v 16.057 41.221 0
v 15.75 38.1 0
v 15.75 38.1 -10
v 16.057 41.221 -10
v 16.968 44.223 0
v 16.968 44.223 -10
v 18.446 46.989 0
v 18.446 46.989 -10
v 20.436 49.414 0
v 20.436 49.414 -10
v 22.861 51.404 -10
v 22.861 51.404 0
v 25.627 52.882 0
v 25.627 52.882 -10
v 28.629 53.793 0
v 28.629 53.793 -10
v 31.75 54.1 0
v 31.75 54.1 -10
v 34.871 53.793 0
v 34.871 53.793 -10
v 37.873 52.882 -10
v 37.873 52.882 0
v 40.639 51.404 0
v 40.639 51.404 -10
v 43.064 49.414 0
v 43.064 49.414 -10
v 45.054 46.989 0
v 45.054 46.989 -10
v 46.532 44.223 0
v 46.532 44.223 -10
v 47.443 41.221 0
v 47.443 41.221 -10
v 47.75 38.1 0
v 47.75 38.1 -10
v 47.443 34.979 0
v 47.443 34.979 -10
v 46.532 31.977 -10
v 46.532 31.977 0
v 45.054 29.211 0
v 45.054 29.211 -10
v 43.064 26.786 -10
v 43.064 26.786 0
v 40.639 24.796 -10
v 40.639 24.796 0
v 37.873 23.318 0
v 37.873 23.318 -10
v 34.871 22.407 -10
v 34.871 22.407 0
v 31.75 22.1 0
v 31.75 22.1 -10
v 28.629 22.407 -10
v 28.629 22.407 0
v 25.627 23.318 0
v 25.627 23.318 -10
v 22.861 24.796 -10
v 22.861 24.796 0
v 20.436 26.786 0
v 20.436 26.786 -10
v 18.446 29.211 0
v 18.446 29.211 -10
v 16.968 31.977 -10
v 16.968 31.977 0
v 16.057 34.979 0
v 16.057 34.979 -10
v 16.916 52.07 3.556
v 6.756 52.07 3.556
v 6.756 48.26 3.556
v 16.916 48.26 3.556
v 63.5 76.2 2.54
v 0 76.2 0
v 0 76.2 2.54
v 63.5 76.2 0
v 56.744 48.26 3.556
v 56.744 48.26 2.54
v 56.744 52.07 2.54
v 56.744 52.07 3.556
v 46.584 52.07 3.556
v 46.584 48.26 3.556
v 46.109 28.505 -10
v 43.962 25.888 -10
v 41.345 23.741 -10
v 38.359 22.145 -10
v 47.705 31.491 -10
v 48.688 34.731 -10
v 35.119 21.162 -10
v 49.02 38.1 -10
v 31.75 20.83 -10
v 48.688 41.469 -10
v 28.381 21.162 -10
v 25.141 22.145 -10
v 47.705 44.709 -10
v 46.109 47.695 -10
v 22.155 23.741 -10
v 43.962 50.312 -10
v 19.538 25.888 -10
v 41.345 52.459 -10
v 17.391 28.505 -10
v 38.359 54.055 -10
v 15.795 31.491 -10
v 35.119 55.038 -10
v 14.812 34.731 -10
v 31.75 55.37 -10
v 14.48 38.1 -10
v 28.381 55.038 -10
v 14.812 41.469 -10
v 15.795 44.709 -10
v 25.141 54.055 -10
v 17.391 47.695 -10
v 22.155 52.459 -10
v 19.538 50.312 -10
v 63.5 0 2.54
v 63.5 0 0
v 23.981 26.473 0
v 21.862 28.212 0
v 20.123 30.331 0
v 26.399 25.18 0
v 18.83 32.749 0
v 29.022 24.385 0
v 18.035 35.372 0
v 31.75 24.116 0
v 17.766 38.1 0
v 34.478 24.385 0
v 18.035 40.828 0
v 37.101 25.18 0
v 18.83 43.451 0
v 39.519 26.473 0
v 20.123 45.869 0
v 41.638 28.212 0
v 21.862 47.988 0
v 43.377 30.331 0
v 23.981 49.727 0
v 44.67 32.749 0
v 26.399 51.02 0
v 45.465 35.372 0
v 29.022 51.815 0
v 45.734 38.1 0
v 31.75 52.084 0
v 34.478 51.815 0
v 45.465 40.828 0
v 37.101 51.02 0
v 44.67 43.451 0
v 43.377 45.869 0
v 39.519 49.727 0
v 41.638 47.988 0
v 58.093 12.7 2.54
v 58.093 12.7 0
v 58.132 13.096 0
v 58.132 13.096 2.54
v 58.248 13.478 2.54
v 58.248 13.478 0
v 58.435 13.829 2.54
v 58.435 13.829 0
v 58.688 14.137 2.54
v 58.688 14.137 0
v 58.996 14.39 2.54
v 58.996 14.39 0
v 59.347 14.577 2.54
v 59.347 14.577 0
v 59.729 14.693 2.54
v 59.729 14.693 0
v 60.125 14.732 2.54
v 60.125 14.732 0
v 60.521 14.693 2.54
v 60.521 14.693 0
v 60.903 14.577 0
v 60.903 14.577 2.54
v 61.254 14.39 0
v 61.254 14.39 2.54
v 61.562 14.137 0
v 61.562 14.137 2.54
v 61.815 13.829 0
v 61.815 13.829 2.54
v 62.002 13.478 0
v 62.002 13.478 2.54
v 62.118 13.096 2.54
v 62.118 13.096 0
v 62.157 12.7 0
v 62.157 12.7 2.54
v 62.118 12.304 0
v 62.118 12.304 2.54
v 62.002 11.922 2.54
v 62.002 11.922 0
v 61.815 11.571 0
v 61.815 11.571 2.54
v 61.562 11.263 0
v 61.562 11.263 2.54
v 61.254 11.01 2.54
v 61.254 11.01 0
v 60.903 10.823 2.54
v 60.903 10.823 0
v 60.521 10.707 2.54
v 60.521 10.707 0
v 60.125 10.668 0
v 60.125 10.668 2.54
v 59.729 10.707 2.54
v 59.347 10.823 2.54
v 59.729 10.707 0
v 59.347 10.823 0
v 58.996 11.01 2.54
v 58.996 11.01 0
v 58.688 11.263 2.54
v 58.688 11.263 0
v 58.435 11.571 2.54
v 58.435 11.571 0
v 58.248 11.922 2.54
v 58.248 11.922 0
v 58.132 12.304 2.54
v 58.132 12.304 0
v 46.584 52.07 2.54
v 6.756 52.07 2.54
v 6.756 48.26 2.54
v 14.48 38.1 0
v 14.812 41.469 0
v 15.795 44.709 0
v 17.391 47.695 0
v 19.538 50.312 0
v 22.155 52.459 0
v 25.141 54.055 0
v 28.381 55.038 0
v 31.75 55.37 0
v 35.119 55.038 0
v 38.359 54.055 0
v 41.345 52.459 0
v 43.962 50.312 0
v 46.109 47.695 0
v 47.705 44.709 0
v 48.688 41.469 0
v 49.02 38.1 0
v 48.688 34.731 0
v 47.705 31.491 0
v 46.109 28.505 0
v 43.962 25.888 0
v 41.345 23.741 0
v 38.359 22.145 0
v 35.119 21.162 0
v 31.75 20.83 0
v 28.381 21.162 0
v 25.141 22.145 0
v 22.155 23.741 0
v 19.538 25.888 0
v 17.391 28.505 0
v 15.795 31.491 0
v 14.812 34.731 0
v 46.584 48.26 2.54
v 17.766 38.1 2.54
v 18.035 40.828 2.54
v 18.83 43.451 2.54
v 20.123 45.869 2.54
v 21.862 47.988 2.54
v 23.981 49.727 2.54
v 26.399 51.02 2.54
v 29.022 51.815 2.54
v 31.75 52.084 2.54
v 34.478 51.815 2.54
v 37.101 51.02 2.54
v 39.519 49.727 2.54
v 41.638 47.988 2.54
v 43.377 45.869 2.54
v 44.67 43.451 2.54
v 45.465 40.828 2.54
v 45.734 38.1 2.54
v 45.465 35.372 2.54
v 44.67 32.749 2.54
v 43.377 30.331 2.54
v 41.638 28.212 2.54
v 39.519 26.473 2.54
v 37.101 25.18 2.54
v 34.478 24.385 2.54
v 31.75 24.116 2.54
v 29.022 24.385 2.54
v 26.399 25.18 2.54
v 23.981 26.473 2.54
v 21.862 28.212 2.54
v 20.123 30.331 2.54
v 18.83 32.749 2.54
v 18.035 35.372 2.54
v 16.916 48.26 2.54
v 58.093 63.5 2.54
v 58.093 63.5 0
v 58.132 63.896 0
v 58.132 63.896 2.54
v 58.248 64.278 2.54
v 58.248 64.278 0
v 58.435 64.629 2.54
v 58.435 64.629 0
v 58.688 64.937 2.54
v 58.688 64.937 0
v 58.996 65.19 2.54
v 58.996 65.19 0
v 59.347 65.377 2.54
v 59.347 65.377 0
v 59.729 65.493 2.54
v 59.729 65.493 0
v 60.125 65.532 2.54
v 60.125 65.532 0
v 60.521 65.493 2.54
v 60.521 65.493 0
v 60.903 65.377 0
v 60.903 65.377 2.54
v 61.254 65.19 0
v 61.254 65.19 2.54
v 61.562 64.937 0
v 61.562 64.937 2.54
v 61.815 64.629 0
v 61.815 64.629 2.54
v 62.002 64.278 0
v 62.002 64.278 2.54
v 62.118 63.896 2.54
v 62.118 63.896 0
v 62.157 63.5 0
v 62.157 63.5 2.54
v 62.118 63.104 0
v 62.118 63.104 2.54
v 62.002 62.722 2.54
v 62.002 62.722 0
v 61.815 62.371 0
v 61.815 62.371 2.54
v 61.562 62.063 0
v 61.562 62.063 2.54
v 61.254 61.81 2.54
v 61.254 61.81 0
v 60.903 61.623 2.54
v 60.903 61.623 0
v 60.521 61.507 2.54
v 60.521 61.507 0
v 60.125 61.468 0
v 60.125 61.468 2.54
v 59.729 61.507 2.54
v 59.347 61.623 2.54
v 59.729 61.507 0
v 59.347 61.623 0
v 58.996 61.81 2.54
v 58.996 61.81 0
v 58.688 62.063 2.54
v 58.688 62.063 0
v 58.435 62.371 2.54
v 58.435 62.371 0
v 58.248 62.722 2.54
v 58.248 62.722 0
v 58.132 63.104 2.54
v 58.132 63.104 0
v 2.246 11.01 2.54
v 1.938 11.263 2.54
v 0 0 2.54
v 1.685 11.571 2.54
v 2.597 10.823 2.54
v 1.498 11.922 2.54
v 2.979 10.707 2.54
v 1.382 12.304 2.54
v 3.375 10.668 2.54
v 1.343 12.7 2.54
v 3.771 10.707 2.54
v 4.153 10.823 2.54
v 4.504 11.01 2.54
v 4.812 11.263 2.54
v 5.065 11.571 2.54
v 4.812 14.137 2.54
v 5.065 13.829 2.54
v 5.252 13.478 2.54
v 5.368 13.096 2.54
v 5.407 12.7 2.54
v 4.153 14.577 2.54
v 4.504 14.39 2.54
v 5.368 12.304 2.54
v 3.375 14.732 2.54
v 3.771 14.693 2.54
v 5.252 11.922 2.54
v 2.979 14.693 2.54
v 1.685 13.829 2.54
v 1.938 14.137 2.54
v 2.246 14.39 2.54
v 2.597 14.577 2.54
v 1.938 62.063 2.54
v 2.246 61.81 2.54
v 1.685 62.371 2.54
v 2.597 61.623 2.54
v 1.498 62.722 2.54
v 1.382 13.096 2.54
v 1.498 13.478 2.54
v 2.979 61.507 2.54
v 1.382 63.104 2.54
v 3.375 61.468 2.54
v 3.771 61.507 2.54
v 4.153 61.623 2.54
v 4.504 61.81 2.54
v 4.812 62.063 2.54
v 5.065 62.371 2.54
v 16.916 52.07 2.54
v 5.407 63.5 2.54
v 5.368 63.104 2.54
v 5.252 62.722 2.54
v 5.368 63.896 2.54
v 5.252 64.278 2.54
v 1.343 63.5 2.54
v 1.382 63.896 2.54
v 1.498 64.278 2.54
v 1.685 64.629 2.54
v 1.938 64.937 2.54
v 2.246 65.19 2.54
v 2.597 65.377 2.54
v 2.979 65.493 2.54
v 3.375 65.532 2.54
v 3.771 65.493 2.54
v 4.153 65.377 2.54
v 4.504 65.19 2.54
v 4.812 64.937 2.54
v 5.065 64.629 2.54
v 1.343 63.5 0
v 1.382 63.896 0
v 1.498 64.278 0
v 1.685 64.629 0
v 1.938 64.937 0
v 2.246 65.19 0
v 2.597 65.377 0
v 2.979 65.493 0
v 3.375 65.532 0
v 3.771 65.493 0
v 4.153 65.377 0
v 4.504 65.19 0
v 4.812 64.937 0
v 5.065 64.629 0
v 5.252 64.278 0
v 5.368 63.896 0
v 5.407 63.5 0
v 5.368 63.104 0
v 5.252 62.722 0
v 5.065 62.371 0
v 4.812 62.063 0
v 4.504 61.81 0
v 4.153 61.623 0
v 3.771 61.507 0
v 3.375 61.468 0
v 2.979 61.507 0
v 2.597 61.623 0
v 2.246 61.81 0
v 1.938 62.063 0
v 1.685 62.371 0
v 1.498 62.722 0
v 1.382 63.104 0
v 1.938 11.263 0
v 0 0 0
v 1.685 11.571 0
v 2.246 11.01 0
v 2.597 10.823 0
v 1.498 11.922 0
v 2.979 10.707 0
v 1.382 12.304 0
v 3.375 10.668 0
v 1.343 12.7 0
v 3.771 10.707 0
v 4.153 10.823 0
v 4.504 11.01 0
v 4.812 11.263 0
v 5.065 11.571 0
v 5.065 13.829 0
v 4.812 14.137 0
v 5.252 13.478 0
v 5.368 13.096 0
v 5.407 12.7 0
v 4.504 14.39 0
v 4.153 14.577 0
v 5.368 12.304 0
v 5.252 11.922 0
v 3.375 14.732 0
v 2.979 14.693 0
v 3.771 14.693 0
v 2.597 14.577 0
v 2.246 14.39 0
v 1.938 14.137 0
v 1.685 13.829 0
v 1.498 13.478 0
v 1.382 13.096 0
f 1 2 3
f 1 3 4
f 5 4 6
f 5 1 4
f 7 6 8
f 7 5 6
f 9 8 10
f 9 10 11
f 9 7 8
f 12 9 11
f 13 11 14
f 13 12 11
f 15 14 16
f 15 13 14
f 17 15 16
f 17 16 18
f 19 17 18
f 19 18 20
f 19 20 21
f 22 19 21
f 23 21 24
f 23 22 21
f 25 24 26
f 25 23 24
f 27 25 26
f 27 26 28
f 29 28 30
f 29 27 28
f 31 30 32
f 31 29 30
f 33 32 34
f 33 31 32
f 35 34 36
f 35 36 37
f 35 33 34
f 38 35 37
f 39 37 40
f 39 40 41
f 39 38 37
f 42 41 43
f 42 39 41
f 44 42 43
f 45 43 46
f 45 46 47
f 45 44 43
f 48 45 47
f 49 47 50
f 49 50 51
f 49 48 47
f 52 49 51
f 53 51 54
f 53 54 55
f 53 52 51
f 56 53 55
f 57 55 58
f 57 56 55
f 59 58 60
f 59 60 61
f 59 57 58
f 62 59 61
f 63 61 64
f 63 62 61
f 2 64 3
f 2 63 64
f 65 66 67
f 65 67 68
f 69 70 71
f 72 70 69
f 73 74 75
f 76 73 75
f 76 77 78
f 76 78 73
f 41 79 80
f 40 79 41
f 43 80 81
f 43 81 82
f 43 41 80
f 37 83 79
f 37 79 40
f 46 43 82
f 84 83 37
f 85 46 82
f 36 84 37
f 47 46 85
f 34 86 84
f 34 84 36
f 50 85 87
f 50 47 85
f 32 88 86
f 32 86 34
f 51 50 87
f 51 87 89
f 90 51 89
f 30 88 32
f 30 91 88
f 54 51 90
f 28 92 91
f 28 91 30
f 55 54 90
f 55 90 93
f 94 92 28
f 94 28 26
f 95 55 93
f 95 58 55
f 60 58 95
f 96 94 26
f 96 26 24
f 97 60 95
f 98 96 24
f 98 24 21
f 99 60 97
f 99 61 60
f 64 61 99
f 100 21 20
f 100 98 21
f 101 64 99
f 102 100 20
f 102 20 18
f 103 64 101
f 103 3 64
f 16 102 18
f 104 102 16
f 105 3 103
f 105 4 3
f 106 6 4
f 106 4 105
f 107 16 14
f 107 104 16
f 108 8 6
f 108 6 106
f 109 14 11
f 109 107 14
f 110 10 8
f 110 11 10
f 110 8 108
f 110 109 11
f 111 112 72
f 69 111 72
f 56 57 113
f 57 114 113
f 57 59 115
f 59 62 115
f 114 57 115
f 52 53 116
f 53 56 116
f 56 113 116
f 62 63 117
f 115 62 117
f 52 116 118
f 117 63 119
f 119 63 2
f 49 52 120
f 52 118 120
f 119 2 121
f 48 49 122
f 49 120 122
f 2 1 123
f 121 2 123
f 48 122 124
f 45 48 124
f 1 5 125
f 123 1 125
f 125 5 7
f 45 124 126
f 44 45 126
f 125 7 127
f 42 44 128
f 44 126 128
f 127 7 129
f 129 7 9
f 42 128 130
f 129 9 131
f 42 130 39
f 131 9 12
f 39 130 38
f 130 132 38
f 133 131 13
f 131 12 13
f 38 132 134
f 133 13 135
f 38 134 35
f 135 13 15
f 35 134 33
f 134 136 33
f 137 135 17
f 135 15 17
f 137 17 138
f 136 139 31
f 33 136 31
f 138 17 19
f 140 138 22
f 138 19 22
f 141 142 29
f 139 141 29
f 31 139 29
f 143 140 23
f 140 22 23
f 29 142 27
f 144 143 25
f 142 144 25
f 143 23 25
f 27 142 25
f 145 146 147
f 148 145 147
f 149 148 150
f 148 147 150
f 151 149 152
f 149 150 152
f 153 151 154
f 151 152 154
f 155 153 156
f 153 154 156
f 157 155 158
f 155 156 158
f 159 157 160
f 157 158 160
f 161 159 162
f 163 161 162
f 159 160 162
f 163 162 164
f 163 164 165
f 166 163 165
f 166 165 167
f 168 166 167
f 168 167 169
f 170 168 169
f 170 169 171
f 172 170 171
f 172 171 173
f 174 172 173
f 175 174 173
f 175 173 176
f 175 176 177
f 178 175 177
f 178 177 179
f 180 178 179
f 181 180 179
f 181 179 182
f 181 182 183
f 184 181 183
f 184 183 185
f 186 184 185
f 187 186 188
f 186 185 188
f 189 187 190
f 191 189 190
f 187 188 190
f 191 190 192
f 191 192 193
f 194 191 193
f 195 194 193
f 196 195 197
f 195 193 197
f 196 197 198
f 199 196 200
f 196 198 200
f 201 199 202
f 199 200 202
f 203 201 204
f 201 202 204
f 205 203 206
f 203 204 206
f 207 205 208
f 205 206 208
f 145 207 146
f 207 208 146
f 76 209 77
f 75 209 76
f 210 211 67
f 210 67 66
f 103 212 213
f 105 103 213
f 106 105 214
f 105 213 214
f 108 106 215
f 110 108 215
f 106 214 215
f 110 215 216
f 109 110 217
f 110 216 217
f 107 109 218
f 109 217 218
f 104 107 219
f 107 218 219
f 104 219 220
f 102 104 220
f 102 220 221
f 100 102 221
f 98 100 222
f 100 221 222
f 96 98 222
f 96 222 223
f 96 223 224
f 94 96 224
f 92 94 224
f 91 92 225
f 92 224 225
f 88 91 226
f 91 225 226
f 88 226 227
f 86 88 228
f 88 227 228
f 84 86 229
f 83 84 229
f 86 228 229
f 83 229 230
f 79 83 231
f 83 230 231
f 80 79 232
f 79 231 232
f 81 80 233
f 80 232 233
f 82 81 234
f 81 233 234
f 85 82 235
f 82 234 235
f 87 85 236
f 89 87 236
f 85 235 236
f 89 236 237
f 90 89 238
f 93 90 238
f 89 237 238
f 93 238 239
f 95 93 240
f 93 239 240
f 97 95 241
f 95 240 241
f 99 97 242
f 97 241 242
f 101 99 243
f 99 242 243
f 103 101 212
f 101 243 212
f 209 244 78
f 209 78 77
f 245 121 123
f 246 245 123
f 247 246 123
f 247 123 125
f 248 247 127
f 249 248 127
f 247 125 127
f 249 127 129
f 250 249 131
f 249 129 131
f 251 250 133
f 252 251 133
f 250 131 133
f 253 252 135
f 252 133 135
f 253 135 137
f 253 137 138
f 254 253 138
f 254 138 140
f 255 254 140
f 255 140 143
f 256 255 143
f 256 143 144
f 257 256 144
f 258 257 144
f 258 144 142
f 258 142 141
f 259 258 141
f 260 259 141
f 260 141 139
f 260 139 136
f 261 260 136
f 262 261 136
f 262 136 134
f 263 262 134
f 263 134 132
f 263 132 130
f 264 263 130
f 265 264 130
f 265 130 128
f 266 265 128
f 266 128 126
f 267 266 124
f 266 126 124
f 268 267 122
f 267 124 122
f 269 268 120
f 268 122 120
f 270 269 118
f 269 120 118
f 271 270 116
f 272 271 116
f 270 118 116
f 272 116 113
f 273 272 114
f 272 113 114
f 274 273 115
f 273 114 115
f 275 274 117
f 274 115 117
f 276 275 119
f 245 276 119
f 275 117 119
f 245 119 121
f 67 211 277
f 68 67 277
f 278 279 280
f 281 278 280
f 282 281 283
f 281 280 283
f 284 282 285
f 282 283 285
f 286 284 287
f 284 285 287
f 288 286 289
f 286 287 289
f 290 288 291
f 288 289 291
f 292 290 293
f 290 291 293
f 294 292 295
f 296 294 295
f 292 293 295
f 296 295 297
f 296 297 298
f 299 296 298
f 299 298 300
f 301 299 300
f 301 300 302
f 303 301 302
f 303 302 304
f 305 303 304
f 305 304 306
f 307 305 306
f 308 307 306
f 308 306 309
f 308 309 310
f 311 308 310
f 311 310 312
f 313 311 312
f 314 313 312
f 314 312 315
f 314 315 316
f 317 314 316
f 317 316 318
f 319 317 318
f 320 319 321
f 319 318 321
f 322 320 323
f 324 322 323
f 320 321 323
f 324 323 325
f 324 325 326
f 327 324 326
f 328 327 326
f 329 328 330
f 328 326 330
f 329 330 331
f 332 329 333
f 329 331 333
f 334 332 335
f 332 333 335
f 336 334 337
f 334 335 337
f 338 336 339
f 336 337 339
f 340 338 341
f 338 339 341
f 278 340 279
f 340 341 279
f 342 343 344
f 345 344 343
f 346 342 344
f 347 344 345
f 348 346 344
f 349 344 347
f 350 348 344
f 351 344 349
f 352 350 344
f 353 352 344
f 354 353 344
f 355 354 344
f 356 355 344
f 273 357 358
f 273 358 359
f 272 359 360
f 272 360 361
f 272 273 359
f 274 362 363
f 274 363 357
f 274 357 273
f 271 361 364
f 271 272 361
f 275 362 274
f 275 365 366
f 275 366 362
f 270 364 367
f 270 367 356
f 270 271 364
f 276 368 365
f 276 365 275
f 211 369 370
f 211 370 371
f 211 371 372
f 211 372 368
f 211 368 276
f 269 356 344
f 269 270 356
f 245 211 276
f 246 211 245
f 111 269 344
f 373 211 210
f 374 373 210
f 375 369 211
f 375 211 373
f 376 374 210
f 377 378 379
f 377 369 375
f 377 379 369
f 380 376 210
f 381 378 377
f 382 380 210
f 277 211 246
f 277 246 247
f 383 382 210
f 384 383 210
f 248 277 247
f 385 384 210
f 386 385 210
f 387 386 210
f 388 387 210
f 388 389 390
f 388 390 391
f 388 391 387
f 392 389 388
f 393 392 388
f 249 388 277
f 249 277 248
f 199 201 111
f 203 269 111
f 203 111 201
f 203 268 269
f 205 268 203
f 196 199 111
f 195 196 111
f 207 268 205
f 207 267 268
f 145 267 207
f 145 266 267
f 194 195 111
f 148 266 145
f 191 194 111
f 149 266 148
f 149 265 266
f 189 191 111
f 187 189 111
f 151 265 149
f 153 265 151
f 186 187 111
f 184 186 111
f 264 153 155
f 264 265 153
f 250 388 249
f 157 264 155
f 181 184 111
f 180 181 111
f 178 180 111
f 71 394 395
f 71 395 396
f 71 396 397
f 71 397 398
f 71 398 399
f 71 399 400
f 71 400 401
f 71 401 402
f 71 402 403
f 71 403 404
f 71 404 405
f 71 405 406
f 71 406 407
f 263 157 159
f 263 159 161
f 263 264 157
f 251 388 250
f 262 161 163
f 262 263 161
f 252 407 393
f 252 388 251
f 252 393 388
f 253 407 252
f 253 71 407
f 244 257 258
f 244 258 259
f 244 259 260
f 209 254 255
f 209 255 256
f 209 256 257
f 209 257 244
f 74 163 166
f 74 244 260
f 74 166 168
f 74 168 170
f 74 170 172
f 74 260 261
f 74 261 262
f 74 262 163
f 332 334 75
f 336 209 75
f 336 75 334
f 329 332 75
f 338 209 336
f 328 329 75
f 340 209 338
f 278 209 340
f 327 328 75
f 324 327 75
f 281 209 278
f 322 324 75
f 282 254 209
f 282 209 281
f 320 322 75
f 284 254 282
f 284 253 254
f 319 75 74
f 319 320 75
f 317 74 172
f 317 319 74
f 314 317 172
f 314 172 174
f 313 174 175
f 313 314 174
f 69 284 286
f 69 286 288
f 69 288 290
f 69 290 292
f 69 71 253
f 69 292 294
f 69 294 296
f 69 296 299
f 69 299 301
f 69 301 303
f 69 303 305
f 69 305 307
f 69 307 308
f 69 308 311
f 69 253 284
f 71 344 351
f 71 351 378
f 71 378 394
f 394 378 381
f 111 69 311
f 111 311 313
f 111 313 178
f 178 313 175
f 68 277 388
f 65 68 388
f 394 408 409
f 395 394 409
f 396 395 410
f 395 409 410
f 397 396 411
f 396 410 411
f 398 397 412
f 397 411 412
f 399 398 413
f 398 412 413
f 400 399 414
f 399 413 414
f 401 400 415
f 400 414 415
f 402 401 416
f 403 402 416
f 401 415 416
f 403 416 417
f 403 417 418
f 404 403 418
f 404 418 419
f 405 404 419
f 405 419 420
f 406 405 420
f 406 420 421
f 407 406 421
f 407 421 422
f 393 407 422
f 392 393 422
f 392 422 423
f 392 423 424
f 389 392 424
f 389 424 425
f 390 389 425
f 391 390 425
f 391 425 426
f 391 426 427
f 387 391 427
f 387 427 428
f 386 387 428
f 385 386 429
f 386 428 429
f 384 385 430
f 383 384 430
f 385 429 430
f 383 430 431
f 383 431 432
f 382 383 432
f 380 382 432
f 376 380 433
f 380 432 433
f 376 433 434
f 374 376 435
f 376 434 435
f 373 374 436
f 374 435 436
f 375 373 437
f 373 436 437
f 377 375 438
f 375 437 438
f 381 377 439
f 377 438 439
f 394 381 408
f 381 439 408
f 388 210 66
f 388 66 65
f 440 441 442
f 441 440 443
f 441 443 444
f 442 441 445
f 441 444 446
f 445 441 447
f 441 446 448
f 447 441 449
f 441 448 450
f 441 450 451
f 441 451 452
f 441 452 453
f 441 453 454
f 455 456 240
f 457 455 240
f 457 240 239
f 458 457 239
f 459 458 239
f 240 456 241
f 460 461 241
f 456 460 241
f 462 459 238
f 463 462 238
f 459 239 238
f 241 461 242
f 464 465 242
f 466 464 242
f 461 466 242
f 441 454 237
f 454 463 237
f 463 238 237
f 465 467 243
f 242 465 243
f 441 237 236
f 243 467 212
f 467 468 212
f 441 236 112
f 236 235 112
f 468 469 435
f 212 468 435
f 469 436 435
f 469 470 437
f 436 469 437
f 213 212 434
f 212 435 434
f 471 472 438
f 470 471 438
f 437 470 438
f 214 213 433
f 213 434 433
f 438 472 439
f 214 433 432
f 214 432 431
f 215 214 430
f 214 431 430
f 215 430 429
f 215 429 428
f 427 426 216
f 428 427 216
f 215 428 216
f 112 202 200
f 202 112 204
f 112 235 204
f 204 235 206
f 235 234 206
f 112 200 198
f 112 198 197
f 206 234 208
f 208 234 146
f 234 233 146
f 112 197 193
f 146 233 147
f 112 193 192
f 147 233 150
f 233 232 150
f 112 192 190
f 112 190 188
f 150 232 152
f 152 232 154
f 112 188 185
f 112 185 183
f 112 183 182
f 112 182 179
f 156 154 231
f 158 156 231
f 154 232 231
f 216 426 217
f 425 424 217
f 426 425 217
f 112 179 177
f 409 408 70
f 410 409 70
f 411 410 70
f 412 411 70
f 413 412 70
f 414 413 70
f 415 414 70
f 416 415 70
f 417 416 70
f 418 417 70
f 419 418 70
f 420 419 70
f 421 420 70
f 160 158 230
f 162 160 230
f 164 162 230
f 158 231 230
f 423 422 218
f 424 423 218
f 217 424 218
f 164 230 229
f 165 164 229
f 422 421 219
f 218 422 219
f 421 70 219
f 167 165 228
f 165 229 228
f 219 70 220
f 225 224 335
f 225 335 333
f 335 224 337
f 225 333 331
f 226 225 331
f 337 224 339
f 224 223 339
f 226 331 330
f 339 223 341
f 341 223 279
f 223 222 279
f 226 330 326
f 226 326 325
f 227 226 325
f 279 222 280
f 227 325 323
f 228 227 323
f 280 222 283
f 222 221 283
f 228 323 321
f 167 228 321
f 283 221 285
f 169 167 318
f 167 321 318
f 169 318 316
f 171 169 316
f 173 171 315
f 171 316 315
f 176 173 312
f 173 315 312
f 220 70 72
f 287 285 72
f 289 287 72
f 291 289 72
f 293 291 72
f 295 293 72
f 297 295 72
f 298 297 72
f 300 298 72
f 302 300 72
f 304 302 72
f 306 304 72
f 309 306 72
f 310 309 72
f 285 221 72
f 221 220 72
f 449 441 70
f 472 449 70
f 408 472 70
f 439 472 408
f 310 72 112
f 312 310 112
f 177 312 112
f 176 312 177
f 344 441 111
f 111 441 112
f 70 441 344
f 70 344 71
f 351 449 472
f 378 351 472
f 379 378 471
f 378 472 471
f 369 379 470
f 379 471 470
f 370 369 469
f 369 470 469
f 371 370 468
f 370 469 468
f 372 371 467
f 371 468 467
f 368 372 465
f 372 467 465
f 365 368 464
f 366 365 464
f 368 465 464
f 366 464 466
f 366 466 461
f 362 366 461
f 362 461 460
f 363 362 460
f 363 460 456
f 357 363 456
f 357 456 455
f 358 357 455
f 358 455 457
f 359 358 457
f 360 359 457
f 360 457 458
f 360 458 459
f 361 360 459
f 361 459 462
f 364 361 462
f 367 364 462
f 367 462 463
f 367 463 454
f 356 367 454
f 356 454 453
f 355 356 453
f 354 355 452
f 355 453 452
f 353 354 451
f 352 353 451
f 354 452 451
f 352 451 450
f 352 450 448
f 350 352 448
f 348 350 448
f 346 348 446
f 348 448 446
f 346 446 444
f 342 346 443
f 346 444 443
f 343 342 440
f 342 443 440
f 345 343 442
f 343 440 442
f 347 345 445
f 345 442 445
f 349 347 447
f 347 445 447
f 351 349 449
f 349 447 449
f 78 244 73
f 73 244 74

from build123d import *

# Parameters (mm, degrees)
SKETCH3_W           = 63.5
SKETCH3_H           = 76.2
BOSS_EXTRUDE2_DEPTH = 2.54
SKETCH4_R           = 17.270000004
SKETCH4_R_2         = 16.000000004
BOSS_EXTRUDE3_DEPTH = 10
SKETCH5_R           = 13.983999972
CUT_EXTRUDE1_DEPTH  = 10.0076
SKETCH8_R           = 2.032
CUT_EXTRUDE2_DEPTH  = 3.54
SKETCH9_W           = 10.16
SKETCH9_H           = 3.81
BOSS_EXTRUDE4_DEPTH = 1.016


with BuildPart() as part:
    # Sketch3 → Boss-Extrude2 (new body)
    with BuildSketch(Plane.XY):
        with Locations((31.75, 38.1)):
            Rectangle(SKETCH3_W, SKETCH3_H)
    extrude(amount=BOSS_EXTRUDE2_DEPTH)

    # Sketch4 → Boss-Extrude3 (add)
    with BuildSketch(Plane(origin=(0, 0, 0), x_dir=(-1, 0, 0), z_dir=(0, 0, -1))):
        with Locations((-31.75, 38.1)):
            Circle(SKETCH4_R)
        with Locations((-31.75, 38.1)):
            Circle(SKETCH4_R_2, mode=Mode.SUBTRACT)
    extrude(amount=BOSS_EXTRUDE3_DEPTH)

    # Sketch5 → Cut-Extrude1 (cut)
    with BuildSketch(Plane(origin=(0, 0, 0), x_dir=(-1, 0, 0), z_dir=(0, 0, -1))):
        with Locations((-31.75, 38.1)):
            Circle(SKETCH5_R)
    extrude(amount=-CUT_EXTRUDE1_DEPTH, mode=Mode.SUBTRACT)

    # Sketch8 → Cut-Extrude2 (cut, through all)
    with BuildSketch(Plane(origin=(0, 0, 0), x_dir=(-1, 0, 0), z_dir=(0, 0, -1))):
        with Locations((-3.375, 63.5)):
            Circle(SKETCH8_R)
        with Locations((-60.125, 63.5)):
            Circle(SKETCH8_R)
        with Locations((-60.125, 12.7)):
            Circle(SKETCH8_R)
        with Locations((-3.375, 12.7)):
            Circle(SKETCH8_R)
    extrude(amount=-CUT_EXTRUDE2_DEPTH, mode=Mode.SUBTRACT)

    # Sketch9 → Boss-Extrude4 (add)
    with BuildSketch(Plane.XY.offset(2.54)):
        with Locations((51.6636, 50.165)):
            Rectangle(SKETCH9_W, SKETCH9_H)
        with Locations((11.8364, 50.165)):
            Rectangle(SKETCH9_W, SKETCH9_H)
    extrude(amount=BOSS_EXTRUDE4_DEPTH)


solid = part.part
